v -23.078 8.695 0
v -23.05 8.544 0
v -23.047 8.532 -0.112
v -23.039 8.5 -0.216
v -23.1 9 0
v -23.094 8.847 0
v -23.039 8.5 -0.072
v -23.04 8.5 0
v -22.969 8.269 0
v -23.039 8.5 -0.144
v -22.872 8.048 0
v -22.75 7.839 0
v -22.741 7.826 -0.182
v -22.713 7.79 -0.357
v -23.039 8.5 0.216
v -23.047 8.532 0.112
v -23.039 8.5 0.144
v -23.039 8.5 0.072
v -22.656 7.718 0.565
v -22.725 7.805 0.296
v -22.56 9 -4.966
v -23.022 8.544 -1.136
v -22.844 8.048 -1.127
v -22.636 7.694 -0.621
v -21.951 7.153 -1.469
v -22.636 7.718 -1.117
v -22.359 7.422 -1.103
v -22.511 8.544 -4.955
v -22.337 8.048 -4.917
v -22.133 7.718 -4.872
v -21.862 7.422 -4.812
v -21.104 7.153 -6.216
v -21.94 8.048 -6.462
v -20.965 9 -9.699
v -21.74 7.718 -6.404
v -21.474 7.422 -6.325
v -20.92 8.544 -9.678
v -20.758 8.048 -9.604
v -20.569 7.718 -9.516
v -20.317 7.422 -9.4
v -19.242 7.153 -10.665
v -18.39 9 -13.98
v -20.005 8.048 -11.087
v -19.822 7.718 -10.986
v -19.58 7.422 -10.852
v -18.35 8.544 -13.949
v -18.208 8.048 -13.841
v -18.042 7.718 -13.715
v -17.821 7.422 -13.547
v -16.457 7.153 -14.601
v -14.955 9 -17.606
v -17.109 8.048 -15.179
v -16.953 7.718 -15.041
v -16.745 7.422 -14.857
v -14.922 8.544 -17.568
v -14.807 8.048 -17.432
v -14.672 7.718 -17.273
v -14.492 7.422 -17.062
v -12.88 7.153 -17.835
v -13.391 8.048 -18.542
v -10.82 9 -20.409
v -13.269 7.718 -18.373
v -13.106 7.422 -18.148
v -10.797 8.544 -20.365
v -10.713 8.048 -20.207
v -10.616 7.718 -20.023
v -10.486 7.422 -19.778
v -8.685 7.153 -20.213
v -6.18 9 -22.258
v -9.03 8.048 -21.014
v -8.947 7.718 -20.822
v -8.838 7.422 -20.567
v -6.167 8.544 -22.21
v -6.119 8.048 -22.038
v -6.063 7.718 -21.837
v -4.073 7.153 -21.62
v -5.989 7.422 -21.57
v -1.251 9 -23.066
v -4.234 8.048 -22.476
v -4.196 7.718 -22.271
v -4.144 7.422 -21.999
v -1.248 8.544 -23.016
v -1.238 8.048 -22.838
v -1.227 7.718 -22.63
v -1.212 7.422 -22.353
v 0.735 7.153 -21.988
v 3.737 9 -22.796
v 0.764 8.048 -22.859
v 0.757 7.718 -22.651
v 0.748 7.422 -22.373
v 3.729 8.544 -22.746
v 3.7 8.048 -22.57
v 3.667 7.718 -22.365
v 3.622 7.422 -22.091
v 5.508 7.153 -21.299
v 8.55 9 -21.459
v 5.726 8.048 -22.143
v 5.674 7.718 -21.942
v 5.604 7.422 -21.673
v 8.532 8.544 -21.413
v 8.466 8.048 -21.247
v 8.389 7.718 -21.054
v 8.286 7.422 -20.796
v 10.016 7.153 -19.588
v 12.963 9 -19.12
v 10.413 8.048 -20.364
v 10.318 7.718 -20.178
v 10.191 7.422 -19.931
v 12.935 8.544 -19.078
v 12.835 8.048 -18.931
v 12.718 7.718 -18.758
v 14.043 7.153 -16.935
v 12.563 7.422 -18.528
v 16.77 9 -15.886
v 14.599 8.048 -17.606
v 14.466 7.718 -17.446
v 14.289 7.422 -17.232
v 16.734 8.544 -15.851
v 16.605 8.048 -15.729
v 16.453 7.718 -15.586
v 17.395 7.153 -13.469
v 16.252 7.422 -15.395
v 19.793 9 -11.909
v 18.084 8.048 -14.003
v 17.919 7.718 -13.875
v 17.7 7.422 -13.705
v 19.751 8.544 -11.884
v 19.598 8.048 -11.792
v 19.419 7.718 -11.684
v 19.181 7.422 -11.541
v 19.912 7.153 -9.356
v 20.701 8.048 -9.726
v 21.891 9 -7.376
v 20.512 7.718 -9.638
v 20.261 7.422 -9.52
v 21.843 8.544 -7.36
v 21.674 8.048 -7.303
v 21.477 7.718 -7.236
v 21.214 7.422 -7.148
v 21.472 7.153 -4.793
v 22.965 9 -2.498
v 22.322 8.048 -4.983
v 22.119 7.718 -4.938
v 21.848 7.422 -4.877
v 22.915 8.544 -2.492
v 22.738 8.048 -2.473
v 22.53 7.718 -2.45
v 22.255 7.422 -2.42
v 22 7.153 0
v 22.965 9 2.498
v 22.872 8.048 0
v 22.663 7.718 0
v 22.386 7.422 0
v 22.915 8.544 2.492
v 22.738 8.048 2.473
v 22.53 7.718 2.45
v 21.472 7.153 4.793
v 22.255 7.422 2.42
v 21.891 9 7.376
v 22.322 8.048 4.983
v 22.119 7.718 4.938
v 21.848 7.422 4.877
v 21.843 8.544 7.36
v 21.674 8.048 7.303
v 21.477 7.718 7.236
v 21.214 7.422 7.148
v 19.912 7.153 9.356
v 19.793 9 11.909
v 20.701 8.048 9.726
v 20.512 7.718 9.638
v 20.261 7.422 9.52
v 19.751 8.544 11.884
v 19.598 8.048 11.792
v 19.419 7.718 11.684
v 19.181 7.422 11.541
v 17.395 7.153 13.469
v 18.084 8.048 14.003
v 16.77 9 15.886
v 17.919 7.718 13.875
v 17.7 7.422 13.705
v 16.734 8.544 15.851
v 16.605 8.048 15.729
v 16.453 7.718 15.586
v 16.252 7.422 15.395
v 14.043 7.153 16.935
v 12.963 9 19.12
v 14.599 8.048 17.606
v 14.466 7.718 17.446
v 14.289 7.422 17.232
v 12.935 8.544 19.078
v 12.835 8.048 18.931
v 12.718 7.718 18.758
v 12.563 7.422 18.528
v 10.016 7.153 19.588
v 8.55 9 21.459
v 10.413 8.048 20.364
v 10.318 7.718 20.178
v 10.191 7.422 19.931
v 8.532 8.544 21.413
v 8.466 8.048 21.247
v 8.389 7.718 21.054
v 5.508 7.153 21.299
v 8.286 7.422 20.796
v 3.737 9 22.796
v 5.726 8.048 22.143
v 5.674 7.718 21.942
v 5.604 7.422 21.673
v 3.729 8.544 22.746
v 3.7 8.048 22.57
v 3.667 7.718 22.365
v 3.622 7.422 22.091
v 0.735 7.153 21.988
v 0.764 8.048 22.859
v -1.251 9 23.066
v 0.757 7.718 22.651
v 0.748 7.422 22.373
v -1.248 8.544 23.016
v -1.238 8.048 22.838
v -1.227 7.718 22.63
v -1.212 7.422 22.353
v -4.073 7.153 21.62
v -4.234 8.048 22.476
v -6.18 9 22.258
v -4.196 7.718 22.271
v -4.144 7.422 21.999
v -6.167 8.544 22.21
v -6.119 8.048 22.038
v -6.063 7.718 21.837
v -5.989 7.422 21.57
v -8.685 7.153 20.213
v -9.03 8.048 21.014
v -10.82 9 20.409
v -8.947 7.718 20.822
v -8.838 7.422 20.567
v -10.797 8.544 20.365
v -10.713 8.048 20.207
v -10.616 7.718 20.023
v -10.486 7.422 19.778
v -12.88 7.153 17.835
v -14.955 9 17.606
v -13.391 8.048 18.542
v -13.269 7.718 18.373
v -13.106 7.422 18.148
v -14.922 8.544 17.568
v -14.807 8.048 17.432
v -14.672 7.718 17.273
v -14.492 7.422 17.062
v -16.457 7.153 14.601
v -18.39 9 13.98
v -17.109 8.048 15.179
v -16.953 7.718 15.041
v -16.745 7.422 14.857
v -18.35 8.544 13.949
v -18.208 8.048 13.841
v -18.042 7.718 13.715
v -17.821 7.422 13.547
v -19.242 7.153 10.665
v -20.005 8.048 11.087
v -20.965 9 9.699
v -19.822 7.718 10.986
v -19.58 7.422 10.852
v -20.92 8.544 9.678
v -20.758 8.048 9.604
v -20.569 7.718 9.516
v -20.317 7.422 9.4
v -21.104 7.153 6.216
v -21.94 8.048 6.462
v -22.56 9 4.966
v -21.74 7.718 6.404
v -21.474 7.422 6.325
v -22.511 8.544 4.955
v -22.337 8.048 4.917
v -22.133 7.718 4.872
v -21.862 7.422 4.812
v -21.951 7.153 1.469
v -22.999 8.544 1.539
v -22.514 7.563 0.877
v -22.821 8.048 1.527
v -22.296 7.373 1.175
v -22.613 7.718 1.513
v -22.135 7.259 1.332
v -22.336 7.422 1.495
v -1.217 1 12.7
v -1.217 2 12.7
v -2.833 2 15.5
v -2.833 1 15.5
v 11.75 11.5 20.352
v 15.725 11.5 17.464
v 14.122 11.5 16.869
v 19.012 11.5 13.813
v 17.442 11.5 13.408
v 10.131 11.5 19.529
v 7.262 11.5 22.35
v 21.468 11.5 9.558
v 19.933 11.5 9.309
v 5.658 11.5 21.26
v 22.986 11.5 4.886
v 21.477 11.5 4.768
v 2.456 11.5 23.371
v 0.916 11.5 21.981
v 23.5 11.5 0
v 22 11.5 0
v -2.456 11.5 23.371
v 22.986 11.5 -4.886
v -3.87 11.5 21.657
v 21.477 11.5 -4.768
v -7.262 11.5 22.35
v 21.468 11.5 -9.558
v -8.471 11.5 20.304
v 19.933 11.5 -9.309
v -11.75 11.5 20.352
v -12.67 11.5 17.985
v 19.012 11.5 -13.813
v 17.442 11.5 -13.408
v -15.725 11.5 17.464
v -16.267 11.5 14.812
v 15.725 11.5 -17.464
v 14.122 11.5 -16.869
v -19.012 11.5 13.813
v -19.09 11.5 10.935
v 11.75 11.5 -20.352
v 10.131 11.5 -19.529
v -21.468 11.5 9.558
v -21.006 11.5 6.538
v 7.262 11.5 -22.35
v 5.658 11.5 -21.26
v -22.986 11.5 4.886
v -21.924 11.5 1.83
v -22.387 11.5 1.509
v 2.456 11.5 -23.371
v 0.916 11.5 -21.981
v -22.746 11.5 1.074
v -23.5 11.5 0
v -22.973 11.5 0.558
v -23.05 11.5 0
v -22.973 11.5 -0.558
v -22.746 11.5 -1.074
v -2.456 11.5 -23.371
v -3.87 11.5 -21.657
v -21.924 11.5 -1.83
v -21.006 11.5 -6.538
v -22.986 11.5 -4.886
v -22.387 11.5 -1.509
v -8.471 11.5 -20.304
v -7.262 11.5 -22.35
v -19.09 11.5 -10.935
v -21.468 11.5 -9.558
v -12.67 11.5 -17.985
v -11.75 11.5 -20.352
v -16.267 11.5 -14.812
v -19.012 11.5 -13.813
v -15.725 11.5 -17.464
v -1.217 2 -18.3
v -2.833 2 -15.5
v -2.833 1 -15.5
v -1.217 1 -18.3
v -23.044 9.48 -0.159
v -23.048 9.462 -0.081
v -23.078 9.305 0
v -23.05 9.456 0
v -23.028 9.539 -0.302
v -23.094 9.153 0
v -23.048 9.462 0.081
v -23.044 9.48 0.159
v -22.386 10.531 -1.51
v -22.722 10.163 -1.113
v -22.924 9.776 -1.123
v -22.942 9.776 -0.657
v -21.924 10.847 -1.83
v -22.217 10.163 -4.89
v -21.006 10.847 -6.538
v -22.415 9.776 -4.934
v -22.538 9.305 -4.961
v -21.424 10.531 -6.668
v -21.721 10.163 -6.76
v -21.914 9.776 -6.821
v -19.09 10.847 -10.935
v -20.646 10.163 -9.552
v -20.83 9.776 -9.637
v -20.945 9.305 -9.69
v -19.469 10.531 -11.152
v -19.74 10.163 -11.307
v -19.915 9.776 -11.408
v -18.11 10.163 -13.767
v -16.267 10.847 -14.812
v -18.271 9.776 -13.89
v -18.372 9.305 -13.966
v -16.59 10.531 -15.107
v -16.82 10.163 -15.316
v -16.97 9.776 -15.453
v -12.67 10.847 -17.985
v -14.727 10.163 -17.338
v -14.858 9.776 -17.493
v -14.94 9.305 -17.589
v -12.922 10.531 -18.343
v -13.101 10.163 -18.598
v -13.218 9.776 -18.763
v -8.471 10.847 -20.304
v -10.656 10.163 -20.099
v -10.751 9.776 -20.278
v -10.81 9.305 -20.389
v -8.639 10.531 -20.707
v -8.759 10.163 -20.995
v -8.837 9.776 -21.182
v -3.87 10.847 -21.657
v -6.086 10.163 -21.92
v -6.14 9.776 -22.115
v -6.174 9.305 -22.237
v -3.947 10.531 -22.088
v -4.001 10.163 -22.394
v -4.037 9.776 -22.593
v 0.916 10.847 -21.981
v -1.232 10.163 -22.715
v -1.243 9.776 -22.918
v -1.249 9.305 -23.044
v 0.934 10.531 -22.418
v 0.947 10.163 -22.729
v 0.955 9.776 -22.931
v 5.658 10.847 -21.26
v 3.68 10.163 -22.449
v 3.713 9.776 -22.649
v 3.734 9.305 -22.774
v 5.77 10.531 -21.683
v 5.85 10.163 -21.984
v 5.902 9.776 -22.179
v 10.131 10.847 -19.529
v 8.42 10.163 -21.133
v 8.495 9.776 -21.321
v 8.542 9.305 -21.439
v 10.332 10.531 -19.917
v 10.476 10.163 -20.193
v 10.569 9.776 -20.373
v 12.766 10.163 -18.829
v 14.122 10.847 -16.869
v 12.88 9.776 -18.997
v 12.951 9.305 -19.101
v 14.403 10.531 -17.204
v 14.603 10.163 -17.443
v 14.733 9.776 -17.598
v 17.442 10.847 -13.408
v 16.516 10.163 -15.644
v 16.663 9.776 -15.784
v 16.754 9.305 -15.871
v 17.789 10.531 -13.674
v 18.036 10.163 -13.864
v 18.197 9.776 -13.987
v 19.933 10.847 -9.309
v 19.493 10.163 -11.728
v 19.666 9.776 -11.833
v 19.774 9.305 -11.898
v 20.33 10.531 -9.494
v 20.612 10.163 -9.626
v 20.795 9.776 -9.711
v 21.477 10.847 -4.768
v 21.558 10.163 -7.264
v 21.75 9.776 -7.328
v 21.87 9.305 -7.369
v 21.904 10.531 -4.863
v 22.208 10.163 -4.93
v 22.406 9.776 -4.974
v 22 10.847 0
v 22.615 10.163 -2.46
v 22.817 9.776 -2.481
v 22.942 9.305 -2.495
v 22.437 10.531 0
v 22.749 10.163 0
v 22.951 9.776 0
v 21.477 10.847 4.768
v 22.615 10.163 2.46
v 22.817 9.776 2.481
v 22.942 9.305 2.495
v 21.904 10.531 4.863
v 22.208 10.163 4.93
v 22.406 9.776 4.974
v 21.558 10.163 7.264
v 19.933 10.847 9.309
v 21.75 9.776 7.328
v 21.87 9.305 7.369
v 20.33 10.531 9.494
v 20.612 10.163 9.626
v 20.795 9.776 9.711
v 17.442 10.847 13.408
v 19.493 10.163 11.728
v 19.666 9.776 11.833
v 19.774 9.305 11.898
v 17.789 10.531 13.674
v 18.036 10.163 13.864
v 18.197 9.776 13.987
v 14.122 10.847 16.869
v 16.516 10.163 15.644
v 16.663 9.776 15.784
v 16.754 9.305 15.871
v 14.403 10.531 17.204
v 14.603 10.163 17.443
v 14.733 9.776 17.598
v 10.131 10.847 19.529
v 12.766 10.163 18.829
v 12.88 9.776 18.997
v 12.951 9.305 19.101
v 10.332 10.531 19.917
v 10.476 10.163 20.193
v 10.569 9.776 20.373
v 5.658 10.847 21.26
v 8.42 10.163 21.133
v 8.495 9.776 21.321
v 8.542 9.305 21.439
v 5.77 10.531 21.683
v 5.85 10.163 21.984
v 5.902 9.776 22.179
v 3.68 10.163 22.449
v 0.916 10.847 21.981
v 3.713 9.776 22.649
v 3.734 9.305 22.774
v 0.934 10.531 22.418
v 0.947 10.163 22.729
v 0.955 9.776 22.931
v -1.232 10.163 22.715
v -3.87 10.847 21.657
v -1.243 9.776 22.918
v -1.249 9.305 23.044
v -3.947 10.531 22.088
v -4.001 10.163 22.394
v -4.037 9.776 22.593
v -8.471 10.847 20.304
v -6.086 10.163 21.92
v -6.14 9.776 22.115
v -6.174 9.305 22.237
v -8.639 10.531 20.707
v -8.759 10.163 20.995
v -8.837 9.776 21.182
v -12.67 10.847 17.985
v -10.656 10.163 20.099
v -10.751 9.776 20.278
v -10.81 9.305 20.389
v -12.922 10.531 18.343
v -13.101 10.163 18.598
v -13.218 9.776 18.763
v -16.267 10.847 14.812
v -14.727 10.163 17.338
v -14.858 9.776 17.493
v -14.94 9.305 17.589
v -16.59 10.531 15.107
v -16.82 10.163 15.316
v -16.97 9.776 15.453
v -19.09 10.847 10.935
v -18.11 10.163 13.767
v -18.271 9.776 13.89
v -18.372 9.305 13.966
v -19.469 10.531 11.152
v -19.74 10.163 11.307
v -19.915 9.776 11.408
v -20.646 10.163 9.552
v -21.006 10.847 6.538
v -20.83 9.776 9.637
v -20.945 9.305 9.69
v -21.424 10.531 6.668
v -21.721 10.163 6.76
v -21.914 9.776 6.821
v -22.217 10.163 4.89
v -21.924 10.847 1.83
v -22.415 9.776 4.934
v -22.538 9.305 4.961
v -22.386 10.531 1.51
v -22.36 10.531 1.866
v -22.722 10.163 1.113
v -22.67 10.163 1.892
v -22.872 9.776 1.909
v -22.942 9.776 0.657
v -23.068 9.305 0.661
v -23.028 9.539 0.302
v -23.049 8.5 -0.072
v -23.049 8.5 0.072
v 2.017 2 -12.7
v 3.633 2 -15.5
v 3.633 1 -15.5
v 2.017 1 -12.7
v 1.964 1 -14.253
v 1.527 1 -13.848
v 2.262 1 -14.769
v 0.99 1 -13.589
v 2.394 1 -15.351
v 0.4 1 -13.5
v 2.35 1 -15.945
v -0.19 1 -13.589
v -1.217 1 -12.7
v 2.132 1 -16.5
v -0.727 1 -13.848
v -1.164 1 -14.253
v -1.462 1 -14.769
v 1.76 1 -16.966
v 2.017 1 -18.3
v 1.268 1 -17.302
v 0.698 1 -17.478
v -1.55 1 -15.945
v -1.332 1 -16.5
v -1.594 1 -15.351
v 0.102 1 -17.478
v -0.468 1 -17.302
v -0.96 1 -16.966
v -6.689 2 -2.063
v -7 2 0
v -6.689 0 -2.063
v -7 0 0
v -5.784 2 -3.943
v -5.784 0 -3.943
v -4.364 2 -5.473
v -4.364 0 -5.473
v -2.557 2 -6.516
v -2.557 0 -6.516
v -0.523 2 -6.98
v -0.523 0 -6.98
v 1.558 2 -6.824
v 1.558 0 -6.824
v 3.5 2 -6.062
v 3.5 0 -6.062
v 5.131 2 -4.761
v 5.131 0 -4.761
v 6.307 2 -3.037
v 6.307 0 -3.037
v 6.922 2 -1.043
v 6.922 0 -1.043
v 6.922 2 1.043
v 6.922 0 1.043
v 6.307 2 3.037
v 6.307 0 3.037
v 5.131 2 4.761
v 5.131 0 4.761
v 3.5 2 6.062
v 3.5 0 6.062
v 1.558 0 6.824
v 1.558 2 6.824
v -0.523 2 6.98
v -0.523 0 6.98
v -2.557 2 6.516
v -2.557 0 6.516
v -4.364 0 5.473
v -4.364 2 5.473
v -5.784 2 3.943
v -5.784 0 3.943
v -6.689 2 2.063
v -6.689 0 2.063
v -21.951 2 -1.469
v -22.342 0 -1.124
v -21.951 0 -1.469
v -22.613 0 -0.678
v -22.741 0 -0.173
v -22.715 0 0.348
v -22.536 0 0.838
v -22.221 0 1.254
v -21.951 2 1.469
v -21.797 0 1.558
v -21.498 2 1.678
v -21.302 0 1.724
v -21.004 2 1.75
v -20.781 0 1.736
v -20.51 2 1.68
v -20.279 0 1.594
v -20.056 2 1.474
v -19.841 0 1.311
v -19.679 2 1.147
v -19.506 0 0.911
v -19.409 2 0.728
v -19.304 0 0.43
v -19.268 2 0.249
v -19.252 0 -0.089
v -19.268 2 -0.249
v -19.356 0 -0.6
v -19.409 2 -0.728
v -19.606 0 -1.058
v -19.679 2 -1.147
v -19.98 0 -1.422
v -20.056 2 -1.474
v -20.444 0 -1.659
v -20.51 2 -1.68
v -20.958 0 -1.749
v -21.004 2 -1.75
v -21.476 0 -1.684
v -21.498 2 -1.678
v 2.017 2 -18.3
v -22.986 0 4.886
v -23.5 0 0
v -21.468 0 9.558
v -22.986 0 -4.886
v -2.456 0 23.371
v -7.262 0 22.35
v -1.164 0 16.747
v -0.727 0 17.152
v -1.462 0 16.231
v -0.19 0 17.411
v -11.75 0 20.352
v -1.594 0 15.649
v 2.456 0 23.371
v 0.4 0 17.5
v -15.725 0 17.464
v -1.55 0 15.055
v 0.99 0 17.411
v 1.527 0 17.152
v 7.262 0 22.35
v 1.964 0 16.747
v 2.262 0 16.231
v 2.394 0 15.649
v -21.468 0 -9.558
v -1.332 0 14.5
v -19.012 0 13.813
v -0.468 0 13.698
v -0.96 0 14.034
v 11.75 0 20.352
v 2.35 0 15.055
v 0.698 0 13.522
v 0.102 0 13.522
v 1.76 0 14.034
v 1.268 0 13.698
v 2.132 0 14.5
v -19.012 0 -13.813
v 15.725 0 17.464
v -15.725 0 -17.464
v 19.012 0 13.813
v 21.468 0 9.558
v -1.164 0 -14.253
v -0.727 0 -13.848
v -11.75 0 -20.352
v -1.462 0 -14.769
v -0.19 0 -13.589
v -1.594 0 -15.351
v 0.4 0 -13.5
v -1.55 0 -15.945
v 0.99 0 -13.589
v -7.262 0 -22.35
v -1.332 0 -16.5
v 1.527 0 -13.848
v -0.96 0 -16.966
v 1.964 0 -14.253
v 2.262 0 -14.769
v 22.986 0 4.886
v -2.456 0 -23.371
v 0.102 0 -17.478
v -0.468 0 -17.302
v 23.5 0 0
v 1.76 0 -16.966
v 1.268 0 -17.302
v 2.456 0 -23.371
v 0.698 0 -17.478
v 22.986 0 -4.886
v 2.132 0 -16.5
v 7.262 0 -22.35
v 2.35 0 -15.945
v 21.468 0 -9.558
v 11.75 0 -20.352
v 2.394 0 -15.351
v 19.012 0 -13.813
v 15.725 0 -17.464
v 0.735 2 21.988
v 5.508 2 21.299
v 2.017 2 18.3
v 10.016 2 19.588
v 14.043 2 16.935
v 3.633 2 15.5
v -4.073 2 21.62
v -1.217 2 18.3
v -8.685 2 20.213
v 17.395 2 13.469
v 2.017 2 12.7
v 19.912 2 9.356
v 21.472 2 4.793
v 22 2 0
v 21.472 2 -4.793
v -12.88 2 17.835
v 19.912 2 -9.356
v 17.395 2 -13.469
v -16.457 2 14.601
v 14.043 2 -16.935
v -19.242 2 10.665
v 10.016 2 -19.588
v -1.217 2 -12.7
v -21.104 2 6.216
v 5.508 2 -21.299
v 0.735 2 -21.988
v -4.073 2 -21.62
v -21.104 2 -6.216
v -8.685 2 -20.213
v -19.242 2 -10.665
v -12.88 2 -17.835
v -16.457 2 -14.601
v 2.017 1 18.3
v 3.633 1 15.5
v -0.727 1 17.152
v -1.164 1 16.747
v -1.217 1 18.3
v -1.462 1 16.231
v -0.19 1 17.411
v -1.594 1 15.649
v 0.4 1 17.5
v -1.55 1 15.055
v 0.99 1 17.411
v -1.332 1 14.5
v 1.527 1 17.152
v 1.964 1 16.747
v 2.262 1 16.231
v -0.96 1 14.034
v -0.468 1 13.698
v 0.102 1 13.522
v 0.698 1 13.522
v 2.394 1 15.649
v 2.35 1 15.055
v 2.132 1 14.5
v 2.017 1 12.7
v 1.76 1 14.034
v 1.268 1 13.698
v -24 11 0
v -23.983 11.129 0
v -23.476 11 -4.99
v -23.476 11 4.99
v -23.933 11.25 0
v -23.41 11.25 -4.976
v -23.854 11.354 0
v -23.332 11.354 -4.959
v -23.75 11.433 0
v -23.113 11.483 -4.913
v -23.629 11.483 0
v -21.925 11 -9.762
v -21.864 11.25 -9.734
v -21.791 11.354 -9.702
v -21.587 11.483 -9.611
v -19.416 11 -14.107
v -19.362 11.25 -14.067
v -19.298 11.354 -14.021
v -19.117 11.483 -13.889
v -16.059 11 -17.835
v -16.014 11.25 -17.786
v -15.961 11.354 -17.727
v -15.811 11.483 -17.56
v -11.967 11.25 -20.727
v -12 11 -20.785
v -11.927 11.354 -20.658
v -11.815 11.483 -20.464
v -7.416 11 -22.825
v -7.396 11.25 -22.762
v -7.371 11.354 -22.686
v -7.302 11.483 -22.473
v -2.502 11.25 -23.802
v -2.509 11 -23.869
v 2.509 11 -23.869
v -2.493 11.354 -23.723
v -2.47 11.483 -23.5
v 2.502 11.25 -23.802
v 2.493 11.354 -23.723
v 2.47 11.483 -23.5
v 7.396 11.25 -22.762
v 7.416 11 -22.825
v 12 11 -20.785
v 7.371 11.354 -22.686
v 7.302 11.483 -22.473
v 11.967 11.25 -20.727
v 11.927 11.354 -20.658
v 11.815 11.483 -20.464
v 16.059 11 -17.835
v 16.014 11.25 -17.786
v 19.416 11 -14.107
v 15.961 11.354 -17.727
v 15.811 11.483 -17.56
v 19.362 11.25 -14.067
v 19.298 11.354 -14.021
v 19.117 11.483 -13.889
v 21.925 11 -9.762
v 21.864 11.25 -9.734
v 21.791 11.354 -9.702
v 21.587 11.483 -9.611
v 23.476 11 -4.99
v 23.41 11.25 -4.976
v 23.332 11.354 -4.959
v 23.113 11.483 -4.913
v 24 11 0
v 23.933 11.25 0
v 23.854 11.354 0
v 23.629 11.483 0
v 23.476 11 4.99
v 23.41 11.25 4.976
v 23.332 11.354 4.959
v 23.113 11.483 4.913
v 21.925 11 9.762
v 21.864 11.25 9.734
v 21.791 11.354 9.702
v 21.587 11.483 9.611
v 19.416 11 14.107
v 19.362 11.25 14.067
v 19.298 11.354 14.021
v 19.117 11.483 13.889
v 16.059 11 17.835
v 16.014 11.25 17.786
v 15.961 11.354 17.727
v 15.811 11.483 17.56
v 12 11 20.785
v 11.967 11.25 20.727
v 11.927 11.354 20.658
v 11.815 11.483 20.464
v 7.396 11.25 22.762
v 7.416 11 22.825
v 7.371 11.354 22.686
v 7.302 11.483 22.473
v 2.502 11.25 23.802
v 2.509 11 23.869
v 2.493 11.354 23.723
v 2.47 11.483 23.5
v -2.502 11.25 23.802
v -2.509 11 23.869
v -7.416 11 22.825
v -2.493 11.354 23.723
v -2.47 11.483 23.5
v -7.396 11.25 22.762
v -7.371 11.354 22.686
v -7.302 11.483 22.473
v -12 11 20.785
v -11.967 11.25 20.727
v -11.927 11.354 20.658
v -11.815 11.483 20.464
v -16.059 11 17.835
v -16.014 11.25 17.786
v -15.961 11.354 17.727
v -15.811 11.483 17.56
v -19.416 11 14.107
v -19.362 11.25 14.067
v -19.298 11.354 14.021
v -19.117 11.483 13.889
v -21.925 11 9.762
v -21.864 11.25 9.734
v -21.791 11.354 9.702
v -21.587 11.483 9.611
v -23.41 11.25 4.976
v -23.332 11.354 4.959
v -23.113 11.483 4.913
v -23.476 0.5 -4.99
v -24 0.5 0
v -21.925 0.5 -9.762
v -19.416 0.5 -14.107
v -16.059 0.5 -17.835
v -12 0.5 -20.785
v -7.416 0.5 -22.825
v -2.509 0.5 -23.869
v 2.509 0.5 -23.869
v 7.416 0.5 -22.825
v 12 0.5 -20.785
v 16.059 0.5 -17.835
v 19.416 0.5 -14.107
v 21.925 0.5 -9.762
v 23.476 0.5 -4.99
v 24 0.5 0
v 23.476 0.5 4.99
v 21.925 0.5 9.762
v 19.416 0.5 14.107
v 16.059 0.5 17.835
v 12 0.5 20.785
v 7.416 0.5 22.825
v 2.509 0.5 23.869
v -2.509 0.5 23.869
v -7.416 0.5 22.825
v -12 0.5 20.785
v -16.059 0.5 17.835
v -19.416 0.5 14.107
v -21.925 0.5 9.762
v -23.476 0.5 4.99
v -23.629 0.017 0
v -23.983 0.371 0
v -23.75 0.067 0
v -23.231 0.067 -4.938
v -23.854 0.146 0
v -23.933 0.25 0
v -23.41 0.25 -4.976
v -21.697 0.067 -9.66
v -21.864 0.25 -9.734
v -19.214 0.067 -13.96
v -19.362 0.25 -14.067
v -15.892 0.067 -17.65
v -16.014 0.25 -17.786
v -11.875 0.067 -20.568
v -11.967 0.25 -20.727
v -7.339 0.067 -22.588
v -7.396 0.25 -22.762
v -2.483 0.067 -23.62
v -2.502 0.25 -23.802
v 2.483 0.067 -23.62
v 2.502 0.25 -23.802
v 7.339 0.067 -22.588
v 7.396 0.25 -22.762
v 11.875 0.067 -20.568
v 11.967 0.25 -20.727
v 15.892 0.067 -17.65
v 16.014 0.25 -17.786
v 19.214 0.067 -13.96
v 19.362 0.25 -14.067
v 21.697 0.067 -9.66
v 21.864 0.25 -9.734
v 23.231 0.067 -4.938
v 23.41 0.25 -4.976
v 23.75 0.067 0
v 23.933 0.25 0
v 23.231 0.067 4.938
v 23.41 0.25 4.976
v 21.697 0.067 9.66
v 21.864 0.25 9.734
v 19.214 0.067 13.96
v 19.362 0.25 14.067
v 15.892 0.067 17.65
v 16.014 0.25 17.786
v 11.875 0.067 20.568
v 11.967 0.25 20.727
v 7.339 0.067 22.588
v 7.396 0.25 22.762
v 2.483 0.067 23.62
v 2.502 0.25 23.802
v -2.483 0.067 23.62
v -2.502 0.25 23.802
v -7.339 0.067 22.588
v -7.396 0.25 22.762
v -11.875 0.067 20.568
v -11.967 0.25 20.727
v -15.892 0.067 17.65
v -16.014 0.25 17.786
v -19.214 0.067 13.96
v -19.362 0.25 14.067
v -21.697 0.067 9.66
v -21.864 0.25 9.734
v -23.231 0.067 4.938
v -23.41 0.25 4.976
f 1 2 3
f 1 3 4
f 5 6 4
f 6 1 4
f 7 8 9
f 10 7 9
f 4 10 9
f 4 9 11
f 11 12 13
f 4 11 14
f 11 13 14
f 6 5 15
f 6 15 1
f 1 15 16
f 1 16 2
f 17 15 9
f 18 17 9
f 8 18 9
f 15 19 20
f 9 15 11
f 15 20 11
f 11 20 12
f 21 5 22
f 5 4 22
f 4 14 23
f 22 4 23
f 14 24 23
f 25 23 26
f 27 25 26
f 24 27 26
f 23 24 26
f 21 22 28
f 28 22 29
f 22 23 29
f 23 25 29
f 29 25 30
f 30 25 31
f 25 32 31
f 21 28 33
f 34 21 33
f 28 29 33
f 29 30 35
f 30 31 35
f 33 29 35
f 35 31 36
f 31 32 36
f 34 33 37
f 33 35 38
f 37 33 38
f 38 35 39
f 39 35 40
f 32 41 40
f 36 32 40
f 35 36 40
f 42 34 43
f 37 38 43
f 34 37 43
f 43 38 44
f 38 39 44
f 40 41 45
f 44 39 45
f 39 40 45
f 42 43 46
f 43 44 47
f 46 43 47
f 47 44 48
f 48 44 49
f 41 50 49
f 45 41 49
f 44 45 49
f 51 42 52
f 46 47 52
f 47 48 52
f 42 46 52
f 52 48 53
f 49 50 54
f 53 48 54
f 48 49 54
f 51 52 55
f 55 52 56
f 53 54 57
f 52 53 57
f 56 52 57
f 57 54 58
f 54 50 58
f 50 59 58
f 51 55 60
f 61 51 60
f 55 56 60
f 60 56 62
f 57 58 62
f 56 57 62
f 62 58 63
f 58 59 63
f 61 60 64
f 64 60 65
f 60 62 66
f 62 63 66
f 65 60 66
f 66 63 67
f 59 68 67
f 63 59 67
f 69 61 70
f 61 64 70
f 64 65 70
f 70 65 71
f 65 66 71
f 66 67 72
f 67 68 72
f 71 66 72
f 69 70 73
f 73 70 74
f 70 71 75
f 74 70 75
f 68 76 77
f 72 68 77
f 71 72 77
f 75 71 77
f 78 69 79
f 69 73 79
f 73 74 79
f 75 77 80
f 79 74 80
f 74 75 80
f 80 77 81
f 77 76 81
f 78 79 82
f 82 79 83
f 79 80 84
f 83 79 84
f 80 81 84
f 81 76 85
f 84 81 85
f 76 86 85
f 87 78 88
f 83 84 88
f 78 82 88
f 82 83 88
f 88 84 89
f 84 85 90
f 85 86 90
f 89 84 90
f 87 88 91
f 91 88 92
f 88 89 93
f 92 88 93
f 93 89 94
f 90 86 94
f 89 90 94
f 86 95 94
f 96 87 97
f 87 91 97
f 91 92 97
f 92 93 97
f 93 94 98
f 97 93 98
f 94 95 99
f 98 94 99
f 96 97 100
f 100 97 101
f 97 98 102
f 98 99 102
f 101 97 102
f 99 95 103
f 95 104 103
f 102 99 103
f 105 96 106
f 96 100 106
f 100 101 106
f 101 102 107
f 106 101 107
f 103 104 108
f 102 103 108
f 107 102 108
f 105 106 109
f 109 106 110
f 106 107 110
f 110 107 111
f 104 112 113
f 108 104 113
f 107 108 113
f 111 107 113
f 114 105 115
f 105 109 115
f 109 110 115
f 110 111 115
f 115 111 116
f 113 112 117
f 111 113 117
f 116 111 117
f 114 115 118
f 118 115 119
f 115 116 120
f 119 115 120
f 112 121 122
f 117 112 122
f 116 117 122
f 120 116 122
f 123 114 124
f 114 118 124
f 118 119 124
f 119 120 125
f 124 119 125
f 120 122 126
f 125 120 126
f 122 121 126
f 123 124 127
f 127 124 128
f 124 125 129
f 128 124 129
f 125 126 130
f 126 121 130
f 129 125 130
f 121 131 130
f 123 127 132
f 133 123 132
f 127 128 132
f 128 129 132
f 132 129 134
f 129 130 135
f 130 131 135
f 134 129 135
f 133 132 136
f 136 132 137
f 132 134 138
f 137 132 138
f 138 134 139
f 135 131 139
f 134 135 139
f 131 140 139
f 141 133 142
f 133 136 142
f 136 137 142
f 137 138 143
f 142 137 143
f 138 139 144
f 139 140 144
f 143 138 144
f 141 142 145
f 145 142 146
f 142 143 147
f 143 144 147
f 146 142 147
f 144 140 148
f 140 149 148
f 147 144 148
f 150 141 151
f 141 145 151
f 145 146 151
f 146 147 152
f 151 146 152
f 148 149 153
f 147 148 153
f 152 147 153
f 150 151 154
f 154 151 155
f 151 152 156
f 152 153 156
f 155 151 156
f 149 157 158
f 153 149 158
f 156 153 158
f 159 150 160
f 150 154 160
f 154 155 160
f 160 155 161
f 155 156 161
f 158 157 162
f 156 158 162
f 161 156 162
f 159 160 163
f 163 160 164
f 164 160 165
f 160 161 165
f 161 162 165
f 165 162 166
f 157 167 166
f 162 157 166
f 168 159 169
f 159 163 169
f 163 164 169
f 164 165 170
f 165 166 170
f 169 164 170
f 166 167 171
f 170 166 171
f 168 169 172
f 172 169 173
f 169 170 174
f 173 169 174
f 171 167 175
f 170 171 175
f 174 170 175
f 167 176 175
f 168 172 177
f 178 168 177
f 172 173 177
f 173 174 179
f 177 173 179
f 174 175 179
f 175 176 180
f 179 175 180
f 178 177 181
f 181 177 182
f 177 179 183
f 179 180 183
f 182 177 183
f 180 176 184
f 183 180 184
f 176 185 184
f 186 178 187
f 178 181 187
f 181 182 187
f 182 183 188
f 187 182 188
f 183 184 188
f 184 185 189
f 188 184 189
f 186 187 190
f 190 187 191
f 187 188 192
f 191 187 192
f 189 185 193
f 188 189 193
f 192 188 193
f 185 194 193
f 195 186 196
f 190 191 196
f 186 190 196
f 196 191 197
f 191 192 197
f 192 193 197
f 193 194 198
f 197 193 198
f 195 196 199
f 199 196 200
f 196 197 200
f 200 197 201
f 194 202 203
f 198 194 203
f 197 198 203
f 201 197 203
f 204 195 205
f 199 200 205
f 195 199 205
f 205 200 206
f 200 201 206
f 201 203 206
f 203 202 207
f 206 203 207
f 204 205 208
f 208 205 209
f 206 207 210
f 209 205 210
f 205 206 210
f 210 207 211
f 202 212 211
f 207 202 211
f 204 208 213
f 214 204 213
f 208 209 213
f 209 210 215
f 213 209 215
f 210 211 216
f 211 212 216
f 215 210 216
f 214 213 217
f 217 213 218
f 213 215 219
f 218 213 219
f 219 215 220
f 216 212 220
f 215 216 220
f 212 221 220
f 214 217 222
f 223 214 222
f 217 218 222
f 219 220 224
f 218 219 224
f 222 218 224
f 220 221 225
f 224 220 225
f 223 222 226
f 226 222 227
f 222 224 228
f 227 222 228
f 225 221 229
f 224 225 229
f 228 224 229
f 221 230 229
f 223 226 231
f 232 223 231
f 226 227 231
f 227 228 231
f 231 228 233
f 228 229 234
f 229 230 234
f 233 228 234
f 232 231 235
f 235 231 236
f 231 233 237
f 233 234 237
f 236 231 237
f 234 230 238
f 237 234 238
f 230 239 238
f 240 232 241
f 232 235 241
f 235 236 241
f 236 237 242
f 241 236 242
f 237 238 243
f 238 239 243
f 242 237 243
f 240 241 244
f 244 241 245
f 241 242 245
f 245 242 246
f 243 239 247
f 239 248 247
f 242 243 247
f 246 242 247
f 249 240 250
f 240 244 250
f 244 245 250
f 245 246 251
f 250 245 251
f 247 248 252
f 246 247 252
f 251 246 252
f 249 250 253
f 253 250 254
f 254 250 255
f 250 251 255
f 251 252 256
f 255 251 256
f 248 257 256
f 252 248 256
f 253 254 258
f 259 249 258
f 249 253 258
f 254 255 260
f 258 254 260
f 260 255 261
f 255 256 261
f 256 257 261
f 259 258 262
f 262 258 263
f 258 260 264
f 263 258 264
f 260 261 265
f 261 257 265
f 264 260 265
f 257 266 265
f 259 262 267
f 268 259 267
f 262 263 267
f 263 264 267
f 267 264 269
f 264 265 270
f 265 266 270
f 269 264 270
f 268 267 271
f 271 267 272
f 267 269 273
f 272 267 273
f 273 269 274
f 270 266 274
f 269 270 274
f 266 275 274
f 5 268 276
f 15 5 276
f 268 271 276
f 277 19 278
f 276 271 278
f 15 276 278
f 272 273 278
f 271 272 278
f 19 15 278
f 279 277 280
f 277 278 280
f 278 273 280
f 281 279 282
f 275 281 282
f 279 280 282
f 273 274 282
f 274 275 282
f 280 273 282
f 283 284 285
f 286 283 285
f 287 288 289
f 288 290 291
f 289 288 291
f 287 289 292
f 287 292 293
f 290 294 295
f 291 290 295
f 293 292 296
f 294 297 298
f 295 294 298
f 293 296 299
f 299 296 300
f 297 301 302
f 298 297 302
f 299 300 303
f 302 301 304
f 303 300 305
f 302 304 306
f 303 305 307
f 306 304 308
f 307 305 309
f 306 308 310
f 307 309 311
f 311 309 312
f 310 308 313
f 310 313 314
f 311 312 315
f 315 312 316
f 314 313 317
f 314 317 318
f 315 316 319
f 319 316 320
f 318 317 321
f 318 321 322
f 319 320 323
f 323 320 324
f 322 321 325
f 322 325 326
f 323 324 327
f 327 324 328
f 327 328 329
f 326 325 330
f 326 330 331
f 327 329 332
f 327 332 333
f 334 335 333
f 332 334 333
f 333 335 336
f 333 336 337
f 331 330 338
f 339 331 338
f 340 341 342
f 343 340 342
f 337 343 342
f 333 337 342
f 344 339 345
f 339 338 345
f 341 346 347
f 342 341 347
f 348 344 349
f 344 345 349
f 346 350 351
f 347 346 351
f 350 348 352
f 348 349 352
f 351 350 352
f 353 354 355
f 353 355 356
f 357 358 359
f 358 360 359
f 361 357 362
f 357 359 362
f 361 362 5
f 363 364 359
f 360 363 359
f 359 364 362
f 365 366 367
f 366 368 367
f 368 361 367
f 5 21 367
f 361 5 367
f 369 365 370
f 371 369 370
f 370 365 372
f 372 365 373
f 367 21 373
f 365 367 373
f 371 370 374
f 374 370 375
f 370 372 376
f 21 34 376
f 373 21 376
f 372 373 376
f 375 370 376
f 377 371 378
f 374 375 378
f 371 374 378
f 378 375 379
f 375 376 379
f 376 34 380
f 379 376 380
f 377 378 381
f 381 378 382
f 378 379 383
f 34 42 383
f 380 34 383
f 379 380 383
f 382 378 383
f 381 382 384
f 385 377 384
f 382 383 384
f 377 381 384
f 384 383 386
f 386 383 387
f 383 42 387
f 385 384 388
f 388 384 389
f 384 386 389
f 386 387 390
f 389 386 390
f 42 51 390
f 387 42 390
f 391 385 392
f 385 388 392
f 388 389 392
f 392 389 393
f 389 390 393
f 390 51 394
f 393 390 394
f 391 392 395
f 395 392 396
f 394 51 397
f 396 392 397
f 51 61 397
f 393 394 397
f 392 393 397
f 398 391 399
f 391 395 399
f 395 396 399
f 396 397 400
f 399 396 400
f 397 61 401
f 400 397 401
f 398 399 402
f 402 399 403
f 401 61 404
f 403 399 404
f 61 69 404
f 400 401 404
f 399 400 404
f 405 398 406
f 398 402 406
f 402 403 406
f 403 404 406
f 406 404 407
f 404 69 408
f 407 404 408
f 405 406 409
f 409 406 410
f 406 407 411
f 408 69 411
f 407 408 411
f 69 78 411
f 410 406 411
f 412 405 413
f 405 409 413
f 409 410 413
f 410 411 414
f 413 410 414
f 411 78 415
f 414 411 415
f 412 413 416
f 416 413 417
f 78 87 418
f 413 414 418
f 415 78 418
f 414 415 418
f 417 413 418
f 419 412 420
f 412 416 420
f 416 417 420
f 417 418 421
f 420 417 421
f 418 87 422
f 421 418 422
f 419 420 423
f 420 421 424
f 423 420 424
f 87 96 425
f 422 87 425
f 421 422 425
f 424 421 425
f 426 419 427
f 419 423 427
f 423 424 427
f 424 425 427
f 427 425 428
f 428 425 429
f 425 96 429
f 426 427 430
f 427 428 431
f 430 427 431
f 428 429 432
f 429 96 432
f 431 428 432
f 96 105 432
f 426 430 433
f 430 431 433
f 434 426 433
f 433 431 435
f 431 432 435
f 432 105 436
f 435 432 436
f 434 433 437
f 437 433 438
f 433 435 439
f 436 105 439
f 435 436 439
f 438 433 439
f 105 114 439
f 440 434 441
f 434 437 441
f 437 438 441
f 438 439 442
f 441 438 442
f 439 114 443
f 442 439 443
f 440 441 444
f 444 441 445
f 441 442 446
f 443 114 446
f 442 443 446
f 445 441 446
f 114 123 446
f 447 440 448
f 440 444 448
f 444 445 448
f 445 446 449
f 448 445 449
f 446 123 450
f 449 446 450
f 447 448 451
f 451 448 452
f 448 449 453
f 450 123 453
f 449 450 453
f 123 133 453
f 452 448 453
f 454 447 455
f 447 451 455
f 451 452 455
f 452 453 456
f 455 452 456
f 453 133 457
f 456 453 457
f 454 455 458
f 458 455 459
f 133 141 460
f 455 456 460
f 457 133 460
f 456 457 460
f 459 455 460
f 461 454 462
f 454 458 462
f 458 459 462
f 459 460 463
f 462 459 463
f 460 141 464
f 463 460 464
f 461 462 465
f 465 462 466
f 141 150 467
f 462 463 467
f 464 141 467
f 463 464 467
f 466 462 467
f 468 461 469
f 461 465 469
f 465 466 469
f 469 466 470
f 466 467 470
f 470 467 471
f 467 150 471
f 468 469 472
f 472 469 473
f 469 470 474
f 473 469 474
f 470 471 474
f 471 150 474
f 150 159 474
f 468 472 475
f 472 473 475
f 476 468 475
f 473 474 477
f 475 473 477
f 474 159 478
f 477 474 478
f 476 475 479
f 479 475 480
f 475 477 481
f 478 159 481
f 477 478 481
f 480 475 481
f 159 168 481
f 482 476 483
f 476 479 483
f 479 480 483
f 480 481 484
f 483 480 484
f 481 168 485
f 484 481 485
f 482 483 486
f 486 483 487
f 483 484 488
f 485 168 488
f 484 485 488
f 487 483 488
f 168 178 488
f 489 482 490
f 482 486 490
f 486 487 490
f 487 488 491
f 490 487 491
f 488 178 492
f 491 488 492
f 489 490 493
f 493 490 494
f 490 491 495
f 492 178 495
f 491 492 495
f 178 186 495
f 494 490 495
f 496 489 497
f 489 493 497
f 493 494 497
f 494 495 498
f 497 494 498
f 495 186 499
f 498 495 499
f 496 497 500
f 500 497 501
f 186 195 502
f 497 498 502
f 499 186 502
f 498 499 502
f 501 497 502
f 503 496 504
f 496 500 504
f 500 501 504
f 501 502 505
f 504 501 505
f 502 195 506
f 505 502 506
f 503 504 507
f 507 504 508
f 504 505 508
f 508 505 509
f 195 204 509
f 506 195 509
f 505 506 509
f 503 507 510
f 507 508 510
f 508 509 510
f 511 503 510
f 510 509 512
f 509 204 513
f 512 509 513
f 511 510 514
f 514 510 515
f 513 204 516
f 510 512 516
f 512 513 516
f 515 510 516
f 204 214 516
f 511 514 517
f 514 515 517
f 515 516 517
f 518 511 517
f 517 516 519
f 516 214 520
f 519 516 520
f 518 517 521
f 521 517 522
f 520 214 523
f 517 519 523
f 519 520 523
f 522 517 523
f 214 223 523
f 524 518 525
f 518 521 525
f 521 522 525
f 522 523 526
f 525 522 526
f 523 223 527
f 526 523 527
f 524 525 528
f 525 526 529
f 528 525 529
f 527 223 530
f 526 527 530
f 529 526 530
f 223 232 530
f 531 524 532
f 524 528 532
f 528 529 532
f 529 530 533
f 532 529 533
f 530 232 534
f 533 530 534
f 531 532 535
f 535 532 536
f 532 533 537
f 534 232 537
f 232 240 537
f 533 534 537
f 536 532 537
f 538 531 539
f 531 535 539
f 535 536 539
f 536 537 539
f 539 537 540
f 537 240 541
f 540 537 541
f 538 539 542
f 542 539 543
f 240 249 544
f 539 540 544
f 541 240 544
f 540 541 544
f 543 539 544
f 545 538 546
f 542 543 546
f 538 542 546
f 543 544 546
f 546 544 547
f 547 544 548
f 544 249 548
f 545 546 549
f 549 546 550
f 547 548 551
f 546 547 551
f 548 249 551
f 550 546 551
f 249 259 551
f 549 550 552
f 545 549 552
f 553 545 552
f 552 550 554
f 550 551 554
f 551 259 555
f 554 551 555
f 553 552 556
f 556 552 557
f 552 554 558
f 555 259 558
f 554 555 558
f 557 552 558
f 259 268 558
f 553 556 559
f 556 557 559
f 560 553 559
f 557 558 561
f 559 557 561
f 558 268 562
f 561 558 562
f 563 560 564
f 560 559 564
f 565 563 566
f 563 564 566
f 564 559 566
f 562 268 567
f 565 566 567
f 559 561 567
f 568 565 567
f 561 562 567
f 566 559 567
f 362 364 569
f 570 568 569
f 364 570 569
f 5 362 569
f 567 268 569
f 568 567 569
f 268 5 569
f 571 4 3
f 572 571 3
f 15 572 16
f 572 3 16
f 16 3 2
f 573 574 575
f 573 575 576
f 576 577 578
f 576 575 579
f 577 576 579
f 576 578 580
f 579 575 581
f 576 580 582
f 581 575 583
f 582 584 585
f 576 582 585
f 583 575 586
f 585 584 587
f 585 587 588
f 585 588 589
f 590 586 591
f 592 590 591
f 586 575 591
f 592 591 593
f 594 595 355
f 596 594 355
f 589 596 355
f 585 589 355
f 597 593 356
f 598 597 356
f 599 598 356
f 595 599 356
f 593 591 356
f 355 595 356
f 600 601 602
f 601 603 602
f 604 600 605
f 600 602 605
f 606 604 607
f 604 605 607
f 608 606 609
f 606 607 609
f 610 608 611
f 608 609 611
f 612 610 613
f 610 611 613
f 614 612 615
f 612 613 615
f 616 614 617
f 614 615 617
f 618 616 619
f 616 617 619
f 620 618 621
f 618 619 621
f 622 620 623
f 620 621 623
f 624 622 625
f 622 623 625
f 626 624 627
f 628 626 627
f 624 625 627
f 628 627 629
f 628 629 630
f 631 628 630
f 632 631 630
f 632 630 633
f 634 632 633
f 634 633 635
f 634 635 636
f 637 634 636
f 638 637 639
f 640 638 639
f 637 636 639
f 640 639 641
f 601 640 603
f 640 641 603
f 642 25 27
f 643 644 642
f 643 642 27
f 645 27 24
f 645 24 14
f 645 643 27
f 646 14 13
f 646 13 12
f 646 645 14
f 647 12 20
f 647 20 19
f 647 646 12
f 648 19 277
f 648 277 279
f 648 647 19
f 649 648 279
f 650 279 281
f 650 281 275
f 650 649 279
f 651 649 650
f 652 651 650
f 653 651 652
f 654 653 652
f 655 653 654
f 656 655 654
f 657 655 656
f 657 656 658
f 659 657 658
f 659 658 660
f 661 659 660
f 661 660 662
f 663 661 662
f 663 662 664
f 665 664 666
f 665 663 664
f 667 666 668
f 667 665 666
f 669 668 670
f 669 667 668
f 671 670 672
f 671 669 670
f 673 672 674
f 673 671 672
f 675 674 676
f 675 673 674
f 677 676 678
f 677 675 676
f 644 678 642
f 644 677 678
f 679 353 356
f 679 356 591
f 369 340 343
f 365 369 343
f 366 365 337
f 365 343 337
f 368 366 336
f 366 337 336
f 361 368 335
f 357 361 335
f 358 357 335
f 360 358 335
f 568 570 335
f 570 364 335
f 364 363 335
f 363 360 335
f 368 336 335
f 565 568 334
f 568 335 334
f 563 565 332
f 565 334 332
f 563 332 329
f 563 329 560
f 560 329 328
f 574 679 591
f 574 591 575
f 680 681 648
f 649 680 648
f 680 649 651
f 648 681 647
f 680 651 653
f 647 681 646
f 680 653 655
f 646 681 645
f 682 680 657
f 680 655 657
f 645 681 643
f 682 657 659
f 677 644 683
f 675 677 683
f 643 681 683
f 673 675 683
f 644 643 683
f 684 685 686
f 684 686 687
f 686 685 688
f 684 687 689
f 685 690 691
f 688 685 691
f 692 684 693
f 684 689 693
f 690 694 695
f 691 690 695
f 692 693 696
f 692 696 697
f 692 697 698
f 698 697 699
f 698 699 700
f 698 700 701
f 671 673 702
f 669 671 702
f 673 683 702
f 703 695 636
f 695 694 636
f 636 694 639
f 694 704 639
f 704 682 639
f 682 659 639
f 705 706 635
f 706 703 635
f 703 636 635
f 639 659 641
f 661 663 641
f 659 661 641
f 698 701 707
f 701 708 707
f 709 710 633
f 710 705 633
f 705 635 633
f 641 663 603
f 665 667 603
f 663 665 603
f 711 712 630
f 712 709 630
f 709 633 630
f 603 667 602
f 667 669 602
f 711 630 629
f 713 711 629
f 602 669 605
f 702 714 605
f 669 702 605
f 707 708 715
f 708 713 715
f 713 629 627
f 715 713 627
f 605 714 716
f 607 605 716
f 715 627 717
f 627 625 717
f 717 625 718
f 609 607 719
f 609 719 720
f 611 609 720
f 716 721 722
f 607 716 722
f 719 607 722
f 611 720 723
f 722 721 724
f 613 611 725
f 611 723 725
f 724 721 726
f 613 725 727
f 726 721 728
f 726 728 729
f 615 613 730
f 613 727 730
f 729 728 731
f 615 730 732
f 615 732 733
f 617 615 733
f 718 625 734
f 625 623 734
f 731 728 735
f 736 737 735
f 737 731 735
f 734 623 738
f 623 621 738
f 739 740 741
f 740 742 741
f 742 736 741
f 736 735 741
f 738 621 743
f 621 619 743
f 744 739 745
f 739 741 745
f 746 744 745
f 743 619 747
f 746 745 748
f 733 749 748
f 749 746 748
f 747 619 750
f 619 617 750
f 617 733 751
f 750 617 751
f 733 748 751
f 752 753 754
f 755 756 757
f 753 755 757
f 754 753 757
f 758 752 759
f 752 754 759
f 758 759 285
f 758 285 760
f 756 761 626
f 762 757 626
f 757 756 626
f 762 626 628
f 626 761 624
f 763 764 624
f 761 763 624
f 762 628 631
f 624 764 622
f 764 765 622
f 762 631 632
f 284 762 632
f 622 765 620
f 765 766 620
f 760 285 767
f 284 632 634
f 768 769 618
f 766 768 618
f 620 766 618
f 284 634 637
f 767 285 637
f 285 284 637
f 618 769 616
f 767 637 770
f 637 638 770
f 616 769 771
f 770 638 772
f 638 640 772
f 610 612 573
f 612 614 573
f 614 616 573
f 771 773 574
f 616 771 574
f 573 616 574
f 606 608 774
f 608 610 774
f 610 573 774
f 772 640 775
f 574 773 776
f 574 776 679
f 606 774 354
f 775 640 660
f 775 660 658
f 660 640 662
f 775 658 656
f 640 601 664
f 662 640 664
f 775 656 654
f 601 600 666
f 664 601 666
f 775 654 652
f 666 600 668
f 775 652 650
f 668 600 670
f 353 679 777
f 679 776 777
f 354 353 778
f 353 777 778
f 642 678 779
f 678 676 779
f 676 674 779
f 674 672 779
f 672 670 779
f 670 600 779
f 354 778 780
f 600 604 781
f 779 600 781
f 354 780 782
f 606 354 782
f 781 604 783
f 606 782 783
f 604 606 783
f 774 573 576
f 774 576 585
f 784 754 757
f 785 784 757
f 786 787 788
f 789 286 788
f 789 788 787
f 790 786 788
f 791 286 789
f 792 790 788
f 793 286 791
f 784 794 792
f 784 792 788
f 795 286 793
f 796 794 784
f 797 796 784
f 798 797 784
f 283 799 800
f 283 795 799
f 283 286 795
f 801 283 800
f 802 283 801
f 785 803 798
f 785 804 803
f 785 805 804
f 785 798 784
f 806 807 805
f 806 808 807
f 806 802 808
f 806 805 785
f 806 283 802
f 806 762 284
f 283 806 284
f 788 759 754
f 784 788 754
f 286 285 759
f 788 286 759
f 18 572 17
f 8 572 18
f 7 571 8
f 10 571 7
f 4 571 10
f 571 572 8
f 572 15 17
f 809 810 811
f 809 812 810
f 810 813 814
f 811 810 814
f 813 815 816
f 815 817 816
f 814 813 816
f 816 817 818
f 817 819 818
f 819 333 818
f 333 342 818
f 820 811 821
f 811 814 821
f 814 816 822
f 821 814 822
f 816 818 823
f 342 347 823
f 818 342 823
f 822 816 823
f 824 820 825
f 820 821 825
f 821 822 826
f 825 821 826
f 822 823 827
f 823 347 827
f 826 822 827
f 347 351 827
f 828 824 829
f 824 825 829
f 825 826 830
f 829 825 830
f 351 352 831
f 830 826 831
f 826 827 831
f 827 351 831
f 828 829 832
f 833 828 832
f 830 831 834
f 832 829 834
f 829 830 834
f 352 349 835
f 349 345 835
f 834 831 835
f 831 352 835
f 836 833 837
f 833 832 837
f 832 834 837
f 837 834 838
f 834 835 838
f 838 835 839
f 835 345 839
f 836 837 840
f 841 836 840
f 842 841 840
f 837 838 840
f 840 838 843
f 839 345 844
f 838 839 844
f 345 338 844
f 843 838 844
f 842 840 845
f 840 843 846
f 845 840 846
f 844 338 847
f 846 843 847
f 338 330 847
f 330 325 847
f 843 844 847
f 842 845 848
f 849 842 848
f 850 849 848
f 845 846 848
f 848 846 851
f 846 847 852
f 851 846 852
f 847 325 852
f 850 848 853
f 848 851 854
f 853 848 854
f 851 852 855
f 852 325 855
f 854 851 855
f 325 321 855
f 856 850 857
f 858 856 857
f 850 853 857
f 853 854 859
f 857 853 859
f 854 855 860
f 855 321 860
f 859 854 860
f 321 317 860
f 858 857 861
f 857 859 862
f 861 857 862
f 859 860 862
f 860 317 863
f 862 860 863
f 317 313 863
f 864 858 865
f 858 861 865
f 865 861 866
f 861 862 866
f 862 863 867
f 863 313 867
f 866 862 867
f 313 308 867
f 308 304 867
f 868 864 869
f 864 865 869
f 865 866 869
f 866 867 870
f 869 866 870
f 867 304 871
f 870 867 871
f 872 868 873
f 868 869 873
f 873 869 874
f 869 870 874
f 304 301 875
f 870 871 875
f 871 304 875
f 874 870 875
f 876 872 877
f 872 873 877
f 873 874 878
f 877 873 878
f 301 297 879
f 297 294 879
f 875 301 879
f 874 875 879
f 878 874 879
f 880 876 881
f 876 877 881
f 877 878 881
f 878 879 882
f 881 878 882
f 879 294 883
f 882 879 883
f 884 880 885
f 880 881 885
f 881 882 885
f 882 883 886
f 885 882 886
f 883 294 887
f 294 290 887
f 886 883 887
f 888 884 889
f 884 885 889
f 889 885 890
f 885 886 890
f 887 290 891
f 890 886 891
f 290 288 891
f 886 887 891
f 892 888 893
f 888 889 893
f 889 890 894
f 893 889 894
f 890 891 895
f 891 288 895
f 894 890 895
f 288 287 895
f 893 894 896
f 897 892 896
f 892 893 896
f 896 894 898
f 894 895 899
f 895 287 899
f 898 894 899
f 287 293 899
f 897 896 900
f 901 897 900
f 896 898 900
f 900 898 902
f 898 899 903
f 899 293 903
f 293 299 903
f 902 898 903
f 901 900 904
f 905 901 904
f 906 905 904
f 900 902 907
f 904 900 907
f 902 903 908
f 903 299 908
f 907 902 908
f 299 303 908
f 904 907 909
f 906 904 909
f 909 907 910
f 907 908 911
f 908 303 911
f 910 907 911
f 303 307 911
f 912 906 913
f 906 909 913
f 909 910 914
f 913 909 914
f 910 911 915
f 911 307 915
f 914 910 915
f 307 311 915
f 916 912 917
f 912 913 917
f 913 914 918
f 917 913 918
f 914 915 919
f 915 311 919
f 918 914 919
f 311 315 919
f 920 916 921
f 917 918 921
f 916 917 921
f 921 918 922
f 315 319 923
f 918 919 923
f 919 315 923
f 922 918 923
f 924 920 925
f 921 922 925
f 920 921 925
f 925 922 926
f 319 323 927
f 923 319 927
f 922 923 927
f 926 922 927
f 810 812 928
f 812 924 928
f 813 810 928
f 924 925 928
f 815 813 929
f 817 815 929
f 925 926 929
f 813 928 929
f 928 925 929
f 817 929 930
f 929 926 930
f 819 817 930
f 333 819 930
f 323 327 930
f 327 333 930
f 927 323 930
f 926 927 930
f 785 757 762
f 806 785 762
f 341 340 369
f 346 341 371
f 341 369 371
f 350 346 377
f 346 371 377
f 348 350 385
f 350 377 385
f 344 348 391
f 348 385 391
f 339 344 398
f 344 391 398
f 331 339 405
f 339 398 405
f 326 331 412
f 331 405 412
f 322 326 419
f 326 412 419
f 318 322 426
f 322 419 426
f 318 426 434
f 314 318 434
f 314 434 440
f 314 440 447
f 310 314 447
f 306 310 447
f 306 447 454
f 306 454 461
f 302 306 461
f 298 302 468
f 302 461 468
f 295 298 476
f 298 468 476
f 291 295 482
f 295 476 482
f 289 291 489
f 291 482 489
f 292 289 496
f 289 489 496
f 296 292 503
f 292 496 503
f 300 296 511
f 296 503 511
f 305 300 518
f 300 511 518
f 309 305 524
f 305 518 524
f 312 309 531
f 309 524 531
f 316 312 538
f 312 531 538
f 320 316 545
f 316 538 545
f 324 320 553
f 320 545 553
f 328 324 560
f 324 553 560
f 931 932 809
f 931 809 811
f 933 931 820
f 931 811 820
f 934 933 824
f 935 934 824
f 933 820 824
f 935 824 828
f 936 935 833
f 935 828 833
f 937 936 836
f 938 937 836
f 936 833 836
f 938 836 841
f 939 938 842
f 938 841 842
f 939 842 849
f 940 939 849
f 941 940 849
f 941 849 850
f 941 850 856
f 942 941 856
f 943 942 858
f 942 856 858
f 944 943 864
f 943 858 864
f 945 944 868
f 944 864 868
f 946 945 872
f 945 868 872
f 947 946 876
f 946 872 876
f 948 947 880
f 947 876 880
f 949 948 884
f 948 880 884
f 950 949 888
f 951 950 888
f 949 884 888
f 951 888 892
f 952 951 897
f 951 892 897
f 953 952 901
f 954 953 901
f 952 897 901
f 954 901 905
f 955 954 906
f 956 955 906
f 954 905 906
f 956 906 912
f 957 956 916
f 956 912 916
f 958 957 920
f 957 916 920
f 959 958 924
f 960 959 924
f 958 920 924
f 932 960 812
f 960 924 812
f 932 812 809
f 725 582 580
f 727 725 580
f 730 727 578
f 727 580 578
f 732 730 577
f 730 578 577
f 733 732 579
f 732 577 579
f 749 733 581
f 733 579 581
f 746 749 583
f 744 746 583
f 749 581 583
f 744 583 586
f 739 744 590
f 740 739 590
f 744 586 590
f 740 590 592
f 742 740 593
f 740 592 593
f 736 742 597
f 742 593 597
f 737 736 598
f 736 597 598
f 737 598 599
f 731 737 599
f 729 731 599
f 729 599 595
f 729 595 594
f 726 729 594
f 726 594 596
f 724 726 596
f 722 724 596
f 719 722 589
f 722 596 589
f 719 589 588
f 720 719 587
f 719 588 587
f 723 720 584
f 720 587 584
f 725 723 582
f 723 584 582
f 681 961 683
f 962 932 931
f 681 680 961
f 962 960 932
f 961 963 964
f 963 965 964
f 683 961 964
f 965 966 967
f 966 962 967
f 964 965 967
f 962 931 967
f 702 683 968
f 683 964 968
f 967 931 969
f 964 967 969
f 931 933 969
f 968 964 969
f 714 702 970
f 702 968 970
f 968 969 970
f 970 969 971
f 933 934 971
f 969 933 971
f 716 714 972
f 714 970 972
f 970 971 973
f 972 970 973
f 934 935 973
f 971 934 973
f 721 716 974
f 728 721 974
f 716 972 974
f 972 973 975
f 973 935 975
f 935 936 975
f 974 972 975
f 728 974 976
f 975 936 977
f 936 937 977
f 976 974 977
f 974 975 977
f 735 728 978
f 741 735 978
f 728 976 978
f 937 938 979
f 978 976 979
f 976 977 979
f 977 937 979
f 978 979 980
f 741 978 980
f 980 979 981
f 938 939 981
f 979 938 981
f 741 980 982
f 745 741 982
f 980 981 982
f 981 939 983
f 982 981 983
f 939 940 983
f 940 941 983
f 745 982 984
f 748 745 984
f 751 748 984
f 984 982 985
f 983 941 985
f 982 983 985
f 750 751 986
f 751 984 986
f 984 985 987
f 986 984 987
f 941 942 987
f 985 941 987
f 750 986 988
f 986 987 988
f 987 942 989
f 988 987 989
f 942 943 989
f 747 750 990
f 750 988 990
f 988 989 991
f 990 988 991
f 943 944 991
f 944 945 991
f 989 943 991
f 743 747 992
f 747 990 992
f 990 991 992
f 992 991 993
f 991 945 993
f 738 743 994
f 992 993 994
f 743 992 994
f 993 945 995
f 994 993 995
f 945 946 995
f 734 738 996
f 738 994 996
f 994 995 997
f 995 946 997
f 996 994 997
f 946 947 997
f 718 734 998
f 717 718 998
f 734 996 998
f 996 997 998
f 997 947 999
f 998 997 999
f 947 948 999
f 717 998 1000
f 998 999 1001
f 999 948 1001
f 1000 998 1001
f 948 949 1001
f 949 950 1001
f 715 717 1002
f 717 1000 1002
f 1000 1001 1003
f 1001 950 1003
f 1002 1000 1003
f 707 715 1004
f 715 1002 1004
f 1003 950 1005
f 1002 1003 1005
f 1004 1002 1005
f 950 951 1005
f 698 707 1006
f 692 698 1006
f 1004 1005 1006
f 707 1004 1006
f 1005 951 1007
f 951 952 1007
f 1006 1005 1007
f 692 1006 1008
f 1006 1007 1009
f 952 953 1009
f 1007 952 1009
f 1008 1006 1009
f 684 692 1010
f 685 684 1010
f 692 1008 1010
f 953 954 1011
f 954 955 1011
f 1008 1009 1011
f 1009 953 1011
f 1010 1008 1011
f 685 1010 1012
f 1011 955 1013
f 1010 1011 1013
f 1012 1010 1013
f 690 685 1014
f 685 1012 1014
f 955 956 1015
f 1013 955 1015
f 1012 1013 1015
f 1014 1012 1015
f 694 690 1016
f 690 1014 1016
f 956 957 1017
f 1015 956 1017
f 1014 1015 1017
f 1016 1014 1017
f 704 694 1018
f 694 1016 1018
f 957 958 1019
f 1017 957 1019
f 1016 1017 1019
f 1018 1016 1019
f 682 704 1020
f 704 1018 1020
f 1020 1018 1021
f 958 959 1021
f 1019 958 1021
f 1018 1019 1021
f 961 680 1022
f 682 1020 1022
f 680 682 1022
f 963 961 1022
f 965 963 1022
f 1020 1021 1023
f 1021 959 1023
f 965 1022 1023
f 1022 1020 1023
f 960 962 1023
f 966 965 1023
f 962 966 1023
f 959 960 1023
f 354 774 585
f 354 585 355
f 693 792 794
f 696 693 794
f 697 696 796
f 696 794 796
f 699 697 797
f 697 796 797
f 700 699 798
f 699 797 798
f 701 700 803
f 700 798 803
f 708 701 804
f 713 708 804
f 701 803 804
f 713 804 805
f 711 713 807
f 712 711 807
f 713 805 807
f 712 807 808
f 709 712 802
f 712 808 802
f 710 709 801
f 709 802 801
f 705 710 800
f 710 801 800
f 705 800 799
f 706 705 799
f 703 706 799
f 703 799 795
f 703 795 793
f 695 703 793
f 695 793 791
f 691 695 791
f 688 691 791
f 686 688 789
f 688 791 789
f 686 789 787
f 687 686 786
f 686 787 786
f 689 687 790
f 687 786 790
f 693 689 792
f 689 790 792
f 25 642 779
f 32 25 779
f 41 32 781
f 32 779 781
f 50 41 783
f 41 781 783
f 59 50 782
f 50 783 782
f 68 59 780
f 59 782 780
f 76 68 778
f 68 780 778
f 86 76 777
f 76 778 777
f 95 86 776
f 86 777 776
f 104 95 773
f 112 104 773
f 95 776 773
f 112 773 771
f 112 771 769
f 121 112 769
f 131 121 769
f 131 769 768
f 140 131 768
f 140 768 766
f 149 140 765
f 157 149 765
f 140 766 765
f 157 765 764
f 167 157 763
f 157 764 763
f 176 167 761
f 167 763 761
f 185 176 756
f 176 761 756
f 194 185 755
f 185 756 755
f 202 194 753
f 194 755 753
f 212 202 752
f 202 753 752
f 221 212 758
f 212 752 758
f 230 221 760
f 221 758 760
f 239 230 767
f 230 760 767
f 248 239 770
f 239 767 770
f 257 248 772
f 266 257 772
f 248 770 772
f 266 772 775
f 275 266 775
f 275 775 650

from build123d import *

# Parameters (mm, degrees)
FILLET_1_R               = 0.5
SKETCH_11_R              = 2.05
CUT_EXTRUDE_3_DEPTH      = 3
CUT_EXTRUDE_6_DEPTH      = 6
CUT_EXTRUDE_6_DEPTH_BACK = 36.24556726
SKETCH_13_R              = 1.75
CUT_EXTRUDE_7_DEPTH      = 1
SKETCH_16_R              = 2
CUT_EXTRUDE_8_DEPTH      = 1


with BuildPart() as part:
    # 草图2 → 旋转1 (revolve)
    with BuildSketch(Plane.XY, mode=Mode.PRIVATE) as revolve_1_sk:
        with BuildLine():
            Line((7, 2), (7, 0))
            Line((7, 0), (24, 0))
            Line((24, 0), (24, 11.5))
            Line((24, 11.5), (22, 11.5))
            Line((22, 11.5), (22, 10.846618531))
            ThreePointArc((22, 10.846618531), (22.804161855, 10.074709263), (23.1, 9))
            ThreePointArc((23.1, 9), (22.804161855, 7.925290737), (22, 7.153381469))
            Line((22, 7.153381469), (22, 2))
            Line((22, 2), (7, 2))
        make_face()
    revolve(revolve_1_sk.sketch.rotate(Axis((0, 2, 0), (0, -1, 0)), 180), axis=Axis((0, 2, 0), (0, -1, 0)))

    # 圆角1
    fillet_1_edges = [part.edges().sort_by_distance(p)[0] for p in [
        (24, 11.5, 0),
        (24, 0, 0),
    ]]
    fillet(fillet_1_edges, radius=FILLET_1_R)

    # 草图11 → 切除-拉伸3 (cut)
    with BuildSketch(Plane(origin=(0, 11.5, 0), x_dir=(1, 0, 0), z_dir=(0, 1, 0))):
        with Locations((-21, 0)):
            Circle(SKETCH_11_R)
    extrude(amount=-CUT_EXTRUDE_3_DEPTH, mode=Mode.SUBTRACT)

    # 草图13 → 切除-拉伸6 (cut, two sides: drawn at the far end of the back side and taken through both)
    with BuildSketch(Plane(origin=(0, 2, 0), x_dir=(1, 0, 0), z_dir=(0, 1, 0)).offset(-CUT_EXTRUDE_6_DEPTH_BACK)):
        with Locations(Location((-21, 0, 0), (0, 0, 122.913164288))):
            Circle(SKETCH_13_R)
    extrude(amount=CUT_EXTRUDE_6_DEPTH + CUT_EXTRUDE_6_DEPTH_BACK, mode=Mode.SUBTRACT)

    # 草图15 → 切除-拉伸7 (cut)
    with BuildSketch(Plane(origin=(0, 2, 0), x_dir=(1, 0, 0), z_dir=(0, 1, 0))):
        Polygon((-2.833161507, 15.5), (-1.216580754, 18.3), (2.016580754, 18.3), (3.633161507, 15.5), (2.016580754, 12.7), (-1.216580754, 12.7), align=None)
        Polygon((2.016580754, -12.7), (-1.216580754, -12.7), (-2.833161507, -15.5), (-1.216580754, -18.3), (2.016580754, -18.3), (3.633161507, -15.5), align=None)
    extrude(amount=-CUT_EXTRUDE_7_DEPTH, mode=Mode.SUBTRACT)

    # 草图16 → 切除-拉伸8 (cut)
    with BuildSketch(Plane(origin=(0, 1, 0), x_dir=(1, 0, 0), z_dir=(0, 1, 0))):
        with Locations(Location((0.4, 15.5, 0), (0, 0, 270))):
            Circle(SKETCH_16_R)
        with Locations(Location((0.4, -15.5, 0), (0, 0, 270))):
            Circle(SKETCH_16_R)
    extrude(amount=-CUT_EXTRUDE_8_DEPTH, mode=Mode.SUBTRACT)


solid = part.part
